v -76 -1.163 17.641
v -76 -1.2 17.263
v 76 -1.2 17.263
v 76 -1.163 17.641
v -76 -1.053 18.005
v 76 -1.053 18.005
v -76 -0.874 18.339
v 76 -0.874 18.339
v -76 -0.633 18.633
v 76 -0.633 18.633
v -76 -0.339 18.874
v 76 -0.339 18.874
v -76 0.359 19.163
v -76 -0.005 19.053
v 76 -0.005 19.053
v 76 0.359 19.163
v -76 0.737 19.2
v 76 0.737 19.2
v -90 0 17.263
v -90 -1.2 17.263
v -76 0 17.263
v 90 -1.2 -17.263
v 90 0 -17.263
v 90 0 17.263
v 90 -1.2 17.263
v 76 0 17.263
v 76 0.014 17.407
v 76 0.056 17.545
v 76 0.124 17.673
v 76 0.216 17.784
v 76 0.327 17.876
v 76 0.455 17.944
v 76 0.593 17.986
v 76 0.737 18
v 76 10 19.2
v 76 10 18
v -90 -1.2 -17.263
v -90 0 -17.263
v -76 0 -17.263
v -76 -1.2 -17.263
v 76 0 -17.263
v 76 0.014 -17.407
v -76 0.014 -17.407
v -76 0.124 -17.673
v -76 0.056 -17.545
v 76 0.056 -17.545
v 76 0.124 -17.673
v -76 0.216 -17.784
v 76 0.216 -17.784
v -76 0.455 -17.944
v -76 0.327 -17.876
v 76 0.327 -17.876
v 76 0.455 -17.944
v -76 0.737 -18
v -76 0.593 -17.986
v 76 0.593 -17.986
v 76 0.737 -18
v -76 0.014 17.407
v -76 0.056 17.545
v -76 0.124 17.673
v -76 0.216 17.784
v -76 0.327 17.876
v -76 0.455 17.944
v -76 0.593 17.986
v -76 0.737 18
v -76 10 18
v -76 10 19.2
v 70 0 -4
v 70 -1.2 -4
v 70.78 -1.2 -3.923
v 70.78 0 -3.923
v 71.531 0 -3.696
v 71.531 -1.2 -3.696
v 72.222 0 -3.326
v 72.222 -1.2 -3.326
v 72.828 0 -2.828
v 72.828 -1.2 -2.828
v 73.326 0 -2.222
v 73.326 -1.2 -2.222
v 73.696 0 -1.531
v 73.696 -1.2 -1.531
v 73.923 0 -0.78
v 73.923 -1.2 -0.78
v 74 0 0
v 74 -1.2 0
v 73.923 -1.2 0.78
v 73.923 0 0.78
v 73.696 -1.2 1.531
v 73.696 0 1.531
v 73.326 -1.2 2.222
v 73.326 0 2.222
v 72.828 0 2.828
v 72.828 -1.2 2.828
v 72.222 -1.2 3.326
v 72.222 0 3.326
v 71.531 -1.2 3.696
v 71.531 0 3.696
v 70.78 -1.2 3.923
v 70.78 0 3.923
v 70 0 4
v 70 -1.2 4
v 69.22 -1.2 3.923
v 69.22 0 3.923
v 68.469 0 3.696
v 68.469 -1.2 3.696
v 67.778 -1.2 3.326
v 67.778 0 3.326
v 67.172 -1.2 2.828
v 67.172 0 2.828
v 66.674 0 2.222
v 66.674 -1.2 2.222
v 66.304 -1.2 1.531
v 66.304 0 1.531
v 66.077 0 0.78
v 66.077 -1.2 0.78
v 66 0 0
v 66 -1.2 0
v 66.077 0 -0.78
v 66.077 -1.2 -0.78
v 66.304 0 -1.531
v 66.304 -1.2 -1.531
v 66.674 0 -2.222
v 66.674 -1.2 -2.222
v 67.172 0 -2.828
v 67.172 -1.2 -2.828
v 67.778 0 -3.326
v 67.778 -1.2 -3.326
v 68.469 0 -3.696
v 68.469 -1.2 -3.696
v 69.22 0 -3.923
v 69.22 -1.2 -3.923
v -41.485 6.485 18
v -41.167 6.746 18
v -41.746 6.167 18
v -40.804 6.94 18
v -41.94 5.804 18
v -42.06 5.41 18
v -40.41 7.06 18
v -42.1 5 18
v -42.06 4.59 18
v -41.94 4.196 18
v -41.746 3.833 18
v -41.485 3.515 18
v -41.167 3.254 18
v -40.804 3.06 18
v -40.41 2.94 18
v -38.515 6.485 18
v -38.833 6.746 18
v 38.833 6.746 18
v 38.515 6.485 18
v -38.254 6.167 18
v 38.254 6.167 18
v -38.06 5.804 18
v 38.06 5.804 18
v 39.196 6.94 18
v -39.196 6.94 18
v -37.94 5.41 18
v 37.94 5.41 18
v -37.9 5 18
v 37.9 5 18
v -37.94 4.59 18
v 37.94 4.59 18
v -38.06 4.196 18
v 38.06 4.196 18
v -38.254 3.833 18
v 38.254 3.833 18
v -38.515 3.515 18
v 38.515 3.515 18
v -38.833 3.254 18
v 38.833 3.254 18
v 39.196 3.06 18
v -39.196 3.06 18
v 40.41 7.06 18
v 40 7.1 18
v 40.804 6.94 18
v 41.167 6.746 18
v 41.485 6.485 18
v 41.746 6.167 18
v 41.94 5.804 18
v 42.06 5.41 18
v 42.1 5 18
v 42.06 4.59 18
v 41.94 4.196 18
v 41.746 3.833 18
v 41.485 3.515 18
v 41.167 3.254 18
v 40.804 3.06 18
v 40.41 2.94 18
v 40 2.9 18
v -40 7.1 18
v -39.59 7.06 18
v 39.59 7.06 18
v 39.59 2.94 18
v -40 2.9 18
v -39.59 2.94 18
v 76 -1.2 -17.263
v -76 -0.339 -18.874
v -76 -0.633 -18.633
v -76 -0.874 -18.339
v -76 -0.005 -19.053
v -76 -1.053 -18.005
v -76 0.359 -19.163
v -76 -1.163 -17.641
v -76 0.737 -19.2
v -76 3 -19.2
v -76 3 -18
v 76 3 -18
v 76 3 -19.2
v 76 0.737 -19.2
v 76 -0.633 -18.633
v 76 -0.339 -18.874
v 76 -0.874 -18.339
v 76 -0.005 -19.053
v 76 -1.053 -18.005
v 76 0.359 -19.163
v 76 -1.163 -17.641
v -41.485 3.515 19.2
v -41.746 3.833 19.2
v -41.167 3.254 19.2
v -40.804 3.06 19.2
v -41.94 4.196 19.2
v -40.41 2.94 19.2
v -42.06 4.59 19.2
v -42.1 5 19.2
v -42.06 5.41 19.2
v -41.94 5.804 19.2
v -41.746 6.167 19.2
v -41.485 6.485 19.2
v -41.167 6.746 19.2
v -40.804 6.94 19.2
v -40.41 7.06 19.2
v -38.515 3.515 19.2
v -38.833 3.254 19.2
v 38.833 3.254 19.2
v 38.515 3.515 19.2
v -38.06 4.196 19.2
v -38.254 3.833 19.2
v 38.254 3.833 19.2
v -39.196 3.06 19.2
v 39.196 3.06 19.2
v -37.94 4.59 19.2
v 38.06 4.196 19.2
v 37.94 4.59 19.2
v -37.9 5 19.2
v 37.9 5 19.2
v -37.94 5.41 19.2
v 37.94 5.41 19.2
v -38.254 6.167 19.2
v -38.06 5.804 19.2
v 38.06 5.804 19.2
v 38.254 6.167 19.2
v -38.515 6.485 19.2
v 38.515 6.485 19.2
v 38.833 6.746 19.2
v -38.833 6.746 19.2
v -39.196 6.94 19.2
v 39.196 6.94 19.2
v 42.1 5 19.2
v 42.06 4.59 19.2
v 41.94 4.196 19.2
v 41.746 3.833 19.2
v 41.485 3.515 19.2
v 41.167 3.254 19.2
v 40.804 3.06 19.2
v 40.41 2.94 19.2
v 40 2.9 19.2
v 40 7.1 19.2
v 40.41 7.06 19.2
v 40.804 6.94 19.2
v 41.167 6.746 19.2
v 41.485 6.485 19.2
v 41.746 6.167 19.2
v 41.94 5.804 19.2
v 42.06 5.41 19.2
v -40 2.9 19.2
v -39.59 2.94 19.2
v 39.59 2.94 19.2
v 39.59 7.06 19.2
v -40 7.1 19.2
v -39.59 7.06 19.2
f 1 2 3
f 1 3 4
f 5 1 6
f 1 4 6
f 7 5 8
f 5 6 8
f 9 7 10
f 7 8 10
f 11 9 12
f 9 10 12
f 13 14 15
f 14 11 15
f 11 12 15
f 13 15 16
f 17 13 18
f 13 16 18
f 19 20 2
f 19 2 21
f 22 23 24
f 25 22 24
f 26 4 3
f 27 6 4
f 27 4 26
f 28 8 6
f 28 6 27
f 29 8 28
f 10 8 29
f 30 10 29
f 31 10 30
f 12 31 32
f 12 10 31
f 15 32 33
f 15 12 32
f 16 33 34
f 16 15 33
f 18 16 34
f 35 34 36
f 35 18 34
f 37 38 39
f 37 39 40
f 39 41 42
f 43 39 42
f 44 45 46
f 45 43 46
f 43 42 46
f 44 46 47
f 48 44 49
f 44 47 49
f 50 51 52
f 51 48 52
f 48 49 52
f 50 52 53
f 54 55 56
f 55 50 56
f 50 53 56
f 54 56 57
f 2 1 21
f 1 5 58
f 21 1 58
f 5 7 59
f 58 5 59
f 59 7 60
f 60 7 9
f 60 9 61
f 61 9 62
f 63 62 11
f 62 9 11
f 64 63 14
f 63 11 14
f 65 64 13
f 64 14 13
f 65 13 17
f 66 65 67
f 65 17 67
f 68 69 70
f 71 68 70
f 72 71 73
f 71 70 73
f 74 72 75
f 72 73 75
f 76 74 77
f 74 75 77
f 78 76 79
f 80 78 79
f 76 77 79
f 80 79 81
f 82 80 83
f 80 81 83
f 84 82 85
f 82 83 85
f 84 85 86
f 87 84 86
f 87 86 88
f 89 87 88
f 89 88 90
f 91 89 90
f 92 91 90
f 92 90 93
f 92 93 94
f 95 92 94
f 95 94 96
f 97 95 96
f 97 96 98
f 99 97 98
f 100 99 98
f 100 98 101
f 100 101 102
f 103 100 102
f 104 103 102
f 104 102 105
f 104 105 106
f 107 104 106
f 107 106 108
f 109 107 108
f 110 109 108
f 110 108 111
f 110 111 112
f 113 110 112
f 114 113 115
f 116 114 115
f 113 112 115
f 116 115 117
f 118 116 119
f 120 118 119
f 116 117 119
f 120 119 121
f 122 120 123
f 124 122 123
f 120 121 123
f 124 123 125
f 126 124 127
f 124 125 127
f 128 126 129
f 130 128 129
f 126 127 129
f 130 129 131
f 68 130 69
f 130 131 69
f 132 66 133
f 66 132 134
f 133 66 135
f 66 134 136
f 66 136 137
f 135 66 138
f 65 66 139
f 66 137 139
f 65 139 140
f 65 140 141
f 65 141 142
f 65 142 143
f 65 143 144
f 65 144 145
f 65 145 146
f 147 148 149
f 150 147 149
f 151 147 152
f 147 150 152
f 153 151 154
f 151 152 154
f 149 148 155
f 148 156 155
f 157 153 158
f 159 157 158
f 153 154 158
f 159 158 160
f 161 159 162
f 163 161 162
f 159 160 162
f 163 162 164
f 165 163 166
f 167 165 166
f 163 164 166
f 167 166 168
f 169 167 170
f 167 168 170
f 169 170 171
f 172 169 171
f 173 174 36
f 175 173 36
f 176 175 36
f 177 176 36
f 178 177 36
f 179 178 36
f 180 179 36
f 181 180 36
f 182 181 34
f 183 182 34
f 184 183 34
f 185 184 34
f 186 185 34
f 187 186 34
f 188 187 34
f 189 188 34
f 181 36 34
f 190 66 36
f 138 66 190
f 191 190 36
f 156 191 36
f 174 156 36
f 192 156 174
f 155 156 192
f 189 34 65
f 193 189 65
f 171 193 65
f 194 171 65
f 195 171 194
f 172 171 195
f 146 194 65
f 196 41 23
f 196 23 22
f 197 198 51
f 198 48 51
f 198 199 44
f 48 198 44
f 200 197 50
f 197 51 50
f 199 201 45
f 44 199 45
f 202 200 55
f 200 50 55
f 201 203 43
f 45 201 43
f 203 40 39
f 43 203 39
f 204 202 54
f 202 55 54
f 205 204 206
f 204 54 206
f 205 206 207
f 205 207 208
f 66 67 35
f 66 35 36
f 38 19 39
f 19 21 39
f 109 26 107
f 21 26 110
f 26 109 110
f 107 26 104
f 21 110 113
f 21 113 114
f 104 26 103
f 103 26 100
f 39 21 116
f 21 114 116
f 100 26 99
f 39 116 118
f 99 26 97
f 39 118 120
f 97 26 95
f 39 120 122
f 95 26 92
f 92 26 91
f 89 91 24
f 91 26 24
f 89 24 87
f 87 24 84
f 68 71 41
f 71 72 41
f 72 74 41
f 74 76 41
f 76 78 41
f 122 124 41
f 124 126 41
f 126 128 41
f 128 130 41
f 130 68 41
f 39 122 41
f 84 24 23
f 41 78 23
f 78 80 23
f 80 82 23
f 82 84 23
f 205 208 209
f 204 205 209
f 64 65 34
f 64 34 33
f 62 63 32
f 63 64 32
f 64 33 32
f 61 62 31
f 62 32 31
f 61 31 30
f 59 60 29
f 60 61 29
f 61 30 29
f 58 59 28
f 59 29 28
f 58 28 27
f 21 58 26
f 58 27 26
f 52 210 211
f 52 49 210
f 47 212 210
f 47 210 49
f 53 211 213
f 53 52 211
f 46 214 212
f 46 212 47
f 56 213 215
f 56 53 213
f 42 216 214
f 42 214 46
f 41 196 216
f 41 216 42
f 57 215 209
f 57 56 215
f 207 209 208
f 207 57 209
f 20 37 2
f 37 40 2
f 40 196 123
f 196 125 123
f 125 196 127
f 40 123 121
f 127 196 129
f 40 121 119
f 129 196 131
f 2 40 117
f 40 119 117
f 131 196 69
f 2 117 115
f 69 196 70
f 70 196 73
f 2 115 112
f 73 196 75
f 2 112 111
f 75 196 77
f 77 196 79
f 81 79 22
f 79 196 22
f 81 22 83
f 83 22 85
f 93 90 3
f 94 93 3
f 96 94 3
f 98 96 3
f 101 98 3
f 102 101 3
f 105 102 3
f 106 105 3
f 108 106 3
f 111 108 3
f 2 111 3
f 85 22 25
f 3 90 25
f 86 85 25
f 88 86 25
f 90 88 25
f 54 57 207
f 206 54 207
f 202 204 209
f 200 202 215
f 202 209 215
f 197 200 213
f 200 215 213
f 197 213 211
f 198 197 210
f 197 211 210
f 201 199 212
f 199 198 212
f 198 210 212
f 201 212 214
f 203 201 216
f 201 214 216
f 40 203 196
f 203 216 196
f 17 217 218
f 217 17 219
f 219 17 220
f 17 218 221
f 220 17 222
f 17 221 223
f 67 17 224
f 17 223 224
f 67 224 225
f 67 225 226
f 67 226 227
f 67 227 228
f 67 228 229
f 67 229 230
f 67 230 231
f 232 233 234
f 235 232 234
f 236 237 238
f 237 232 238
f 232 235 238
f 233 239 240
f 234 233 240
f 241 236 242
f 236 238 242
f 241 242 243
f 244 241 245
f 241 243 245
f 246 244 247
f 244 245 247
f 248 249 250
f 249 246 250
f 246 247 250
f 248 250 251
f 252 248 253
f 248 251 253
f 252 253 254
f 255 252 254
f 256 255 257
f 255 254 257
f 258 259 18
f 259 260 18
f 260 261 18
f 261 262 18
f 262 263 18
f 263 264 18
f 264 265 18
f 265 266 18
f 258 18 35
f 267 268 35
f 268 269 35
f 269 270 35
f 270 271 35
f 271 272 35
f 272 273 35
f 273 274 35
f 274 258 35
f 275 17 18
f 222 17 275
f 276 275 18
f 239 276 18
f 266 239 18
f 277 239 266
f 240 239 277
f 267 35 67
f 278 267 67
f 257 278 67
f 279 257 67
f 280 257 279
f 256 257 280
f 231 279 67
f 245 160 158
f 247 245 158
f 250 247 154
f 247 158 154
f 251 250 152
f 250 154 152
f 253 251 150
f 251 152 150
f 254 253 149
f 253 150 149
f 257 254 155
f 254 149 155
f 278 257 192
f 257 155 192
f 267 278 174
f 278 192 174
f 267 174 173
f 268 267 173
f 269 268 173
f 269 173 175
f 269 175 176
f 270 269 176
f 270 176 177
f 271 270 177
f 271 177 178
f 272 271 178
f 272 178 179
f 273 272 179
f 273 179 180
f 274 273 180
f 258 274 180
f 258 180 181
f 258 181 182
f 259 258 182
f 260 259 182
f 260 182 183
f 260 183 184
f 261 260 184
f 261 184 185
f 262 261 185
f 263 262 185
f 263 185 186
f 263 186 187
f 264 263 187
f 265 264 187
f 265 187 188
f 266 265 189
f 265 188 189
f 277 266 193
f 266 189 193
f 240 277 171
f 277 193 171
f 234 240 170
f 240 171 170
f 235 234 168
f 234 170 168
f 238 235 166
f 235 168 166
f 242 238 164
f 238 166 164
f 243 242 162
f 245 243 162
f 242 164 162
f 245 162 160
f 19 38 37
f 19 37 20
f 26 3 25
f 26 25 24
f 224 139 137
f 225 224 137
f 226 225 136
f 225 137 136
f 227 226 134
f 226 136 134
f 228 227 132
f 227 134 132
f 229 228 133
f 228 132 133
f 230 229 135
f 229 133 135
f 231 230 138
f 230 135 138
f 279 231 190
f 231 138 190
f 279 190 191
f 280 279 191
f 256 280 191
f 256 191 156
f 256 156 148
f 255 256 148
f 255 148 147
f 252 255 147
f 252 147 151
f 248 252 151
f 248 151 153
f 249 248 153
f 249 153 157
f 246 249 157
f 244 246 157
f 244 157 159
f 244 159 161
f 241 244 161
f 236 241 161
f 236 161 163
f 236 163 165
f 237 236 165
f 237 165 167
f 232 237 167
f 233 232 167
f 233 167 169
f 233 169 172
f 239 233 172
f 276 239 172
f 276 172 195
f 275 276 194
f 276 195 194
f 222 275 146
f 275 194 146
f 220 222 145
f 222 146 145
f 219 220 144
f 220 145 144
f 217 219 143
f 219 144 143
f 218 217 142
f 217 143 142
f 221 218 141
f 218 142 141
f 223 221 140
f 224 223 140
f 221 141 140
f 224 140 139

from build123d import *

# Parameters (mm, degrees)
FLANGE_BASE2_DEPTH      = 90
CORTE_EXTRUS_O3_START   = -90
CORTE_EXTRUS_O3_DEPTH   = 14
CORTE_EXTRUS_O3_START_2 = 76
CORTE_EXTRUS_O3_2_DEPTH = 14
ESBO_O13_R              = 4
CORTE_EXTRUS_O4_DEPTH   = 93.704260959
ESBO_O14_R              = 2.1
CORTE_EXTRUS_O5_DEPTH   = 98.897088823


# Read off the part's stored shape, not the designer's step: Corte-extrusão3
# Sheet-metal steps are written as plain solids
with BuildPart() as part:
    # Esboço1 → Flange-base2 (new, symmetric)
    with BuildSketch(Plane(origin=(0, 0, 0), x_dir=(0, 0, -1), z_dir=(1, 0, 0))):
        with BuildLine():
            Line((-18, 10), (-18, 0.7366))
            ThreePointArc((-18, 0.7366), (-17.784254855, 0.215745145), (-17.2634, 0))
            Line((-17.2634, 0), (17.2634, 0))
            ThreePointArc((17.2634, 0), (17.784254855, 0.215745145), (18, 0.7366))
            Line((18, 0.7366), (18, 3))
            Line((18, 3), (19.2, 3))
            Line((19.2, 3), (19.2, 0.7366))
            ThreePointArc((19.2, 0.7366), (18.632782992, -0.632782992), (17.2634, -1.2))
            Line((17.2634, -1.2), (-17.2634, -1.2))
            ThreePointArc((-17.2634, -1.2), (-18.632782992, -0.632782992), (-19.2, 0.7366))
            Line((-19.2, 0.7366), (-19.2, 10))
            Line((-19.2, 10), (-18, 10))
        make_face()
    extrude(amount=FLANGE_BASE2_DEPTH, both=True)

    # Corte-extrusão3 outline → Corte-extrusão3 (cut)
    with BuildSketch(Plane.YZ.offset(CORTE_EXTRUS_O3_START)):
        with BuildLine():
            Line((-1.2, 17.2634), (0, 17.2634))
            ThreePointArc((0, 17.2634), (0.215745145, 17.784254855), (0.7366, 18))
            Line((0.7366, 18), (10, 18))
            Line((10, 18), (10, 19.2))
            Line((10, 19.2), (0.7366, 19.2))
            ThreePointArc((0.7366, 19.2), (-0.632782992, 18.632782992), (-1.2, 17.2634))
        make_face()
        with BuildLine():
            ThreePointArc((0.7366, -18), (0.215745145, -17.784254855), (0, -17.2634))
            Line((0, -17.2634), (-1.2, -17.2634))
            ThreePointArc((-1.2, -17.2634), (-0.632782992, -18.632782992), (0.7366, -19.2))
            Line((0.7366, -19.2), (3, -19.2))
            Line((3, -19.2), (3, -18))
            Line((3, -18), (0.7366, -18))
        make_face()
    extrude(amount=CORTE_EXTRUS_O3_DEPTH, mode=Mode.SUBTRACT)

    # Corte-extrus_o3 2 outline → Corte-extrus_o3 2 (cut)
    with BuildSketch(Plane.YZ.offset(CORTE_EXTRUS_O3_START_2)):
        with BuildLine():
            Line((-1.2, 17.2634), (0, 17.2634))
            ThreePointArc((0, 17.2634), (0.215745145, 17.784254855), (0.7366, 18))
            Line((0.7366, 18), (10, 18))
            Line((10, 18), (10, 19.2))
            Line((10, 19.2), (0.7366, 19.2))
            ThreePointArc((0.7366, 19.2), (-0.632782992, 18.632782992), (-1.2, 17.2634))
        make_face()
        with BuildLine():
            ThreePointArc((0.7366, -18), (0.215745145, -17.784254855), (0, -17.2634))
            Line((0, -17.2634), (-1.2, -17.2634))
            ThreePointArc((-1.2, -17.2634), (-0.632782992, -18.632782992), (0.7366, -19.2))
            Line((0.7366, -19.2), (3, -19.2))
            Line((3, -19.2), (3, -18))
            Line((3, -18), (0.7366, -18))
        make_face()
    extrude(amount=CORTE_EXTRUS_O3_2_DEPTH, mode=Mode.SUBTRACT)

    # Esboço13 → Corte-extrusão4 (cut, through all)
    with BuildSketch(Plane.XZ.offset(1.2)):
        with Locations(Location((70, 0, 0), (0, 0, 270))):
            Circle(ESBO_O13_R)
    extrude(amount=-CORTE_EXTRUS_O4_DEPTH, mode=Mode.SUBTRACT)

    # Esboço14 → Corte-extrusão5 (cut, through all)
    with BuildSketch(Plane(origin=(0, 0, 18), x_dir=(-1, 0, 0), z_dir=(0, 0, -1))):
        with Locations((-40, 5)):
            Circle(ESBO_O14_R)
        with Locations((40, 5)):
            Circle(ESBO_O14_R)
    extrude(amount=-CORTE_EXTRUS_O5_DEPTH, mode=Mode.SUBTRACT)


solid = part.part
